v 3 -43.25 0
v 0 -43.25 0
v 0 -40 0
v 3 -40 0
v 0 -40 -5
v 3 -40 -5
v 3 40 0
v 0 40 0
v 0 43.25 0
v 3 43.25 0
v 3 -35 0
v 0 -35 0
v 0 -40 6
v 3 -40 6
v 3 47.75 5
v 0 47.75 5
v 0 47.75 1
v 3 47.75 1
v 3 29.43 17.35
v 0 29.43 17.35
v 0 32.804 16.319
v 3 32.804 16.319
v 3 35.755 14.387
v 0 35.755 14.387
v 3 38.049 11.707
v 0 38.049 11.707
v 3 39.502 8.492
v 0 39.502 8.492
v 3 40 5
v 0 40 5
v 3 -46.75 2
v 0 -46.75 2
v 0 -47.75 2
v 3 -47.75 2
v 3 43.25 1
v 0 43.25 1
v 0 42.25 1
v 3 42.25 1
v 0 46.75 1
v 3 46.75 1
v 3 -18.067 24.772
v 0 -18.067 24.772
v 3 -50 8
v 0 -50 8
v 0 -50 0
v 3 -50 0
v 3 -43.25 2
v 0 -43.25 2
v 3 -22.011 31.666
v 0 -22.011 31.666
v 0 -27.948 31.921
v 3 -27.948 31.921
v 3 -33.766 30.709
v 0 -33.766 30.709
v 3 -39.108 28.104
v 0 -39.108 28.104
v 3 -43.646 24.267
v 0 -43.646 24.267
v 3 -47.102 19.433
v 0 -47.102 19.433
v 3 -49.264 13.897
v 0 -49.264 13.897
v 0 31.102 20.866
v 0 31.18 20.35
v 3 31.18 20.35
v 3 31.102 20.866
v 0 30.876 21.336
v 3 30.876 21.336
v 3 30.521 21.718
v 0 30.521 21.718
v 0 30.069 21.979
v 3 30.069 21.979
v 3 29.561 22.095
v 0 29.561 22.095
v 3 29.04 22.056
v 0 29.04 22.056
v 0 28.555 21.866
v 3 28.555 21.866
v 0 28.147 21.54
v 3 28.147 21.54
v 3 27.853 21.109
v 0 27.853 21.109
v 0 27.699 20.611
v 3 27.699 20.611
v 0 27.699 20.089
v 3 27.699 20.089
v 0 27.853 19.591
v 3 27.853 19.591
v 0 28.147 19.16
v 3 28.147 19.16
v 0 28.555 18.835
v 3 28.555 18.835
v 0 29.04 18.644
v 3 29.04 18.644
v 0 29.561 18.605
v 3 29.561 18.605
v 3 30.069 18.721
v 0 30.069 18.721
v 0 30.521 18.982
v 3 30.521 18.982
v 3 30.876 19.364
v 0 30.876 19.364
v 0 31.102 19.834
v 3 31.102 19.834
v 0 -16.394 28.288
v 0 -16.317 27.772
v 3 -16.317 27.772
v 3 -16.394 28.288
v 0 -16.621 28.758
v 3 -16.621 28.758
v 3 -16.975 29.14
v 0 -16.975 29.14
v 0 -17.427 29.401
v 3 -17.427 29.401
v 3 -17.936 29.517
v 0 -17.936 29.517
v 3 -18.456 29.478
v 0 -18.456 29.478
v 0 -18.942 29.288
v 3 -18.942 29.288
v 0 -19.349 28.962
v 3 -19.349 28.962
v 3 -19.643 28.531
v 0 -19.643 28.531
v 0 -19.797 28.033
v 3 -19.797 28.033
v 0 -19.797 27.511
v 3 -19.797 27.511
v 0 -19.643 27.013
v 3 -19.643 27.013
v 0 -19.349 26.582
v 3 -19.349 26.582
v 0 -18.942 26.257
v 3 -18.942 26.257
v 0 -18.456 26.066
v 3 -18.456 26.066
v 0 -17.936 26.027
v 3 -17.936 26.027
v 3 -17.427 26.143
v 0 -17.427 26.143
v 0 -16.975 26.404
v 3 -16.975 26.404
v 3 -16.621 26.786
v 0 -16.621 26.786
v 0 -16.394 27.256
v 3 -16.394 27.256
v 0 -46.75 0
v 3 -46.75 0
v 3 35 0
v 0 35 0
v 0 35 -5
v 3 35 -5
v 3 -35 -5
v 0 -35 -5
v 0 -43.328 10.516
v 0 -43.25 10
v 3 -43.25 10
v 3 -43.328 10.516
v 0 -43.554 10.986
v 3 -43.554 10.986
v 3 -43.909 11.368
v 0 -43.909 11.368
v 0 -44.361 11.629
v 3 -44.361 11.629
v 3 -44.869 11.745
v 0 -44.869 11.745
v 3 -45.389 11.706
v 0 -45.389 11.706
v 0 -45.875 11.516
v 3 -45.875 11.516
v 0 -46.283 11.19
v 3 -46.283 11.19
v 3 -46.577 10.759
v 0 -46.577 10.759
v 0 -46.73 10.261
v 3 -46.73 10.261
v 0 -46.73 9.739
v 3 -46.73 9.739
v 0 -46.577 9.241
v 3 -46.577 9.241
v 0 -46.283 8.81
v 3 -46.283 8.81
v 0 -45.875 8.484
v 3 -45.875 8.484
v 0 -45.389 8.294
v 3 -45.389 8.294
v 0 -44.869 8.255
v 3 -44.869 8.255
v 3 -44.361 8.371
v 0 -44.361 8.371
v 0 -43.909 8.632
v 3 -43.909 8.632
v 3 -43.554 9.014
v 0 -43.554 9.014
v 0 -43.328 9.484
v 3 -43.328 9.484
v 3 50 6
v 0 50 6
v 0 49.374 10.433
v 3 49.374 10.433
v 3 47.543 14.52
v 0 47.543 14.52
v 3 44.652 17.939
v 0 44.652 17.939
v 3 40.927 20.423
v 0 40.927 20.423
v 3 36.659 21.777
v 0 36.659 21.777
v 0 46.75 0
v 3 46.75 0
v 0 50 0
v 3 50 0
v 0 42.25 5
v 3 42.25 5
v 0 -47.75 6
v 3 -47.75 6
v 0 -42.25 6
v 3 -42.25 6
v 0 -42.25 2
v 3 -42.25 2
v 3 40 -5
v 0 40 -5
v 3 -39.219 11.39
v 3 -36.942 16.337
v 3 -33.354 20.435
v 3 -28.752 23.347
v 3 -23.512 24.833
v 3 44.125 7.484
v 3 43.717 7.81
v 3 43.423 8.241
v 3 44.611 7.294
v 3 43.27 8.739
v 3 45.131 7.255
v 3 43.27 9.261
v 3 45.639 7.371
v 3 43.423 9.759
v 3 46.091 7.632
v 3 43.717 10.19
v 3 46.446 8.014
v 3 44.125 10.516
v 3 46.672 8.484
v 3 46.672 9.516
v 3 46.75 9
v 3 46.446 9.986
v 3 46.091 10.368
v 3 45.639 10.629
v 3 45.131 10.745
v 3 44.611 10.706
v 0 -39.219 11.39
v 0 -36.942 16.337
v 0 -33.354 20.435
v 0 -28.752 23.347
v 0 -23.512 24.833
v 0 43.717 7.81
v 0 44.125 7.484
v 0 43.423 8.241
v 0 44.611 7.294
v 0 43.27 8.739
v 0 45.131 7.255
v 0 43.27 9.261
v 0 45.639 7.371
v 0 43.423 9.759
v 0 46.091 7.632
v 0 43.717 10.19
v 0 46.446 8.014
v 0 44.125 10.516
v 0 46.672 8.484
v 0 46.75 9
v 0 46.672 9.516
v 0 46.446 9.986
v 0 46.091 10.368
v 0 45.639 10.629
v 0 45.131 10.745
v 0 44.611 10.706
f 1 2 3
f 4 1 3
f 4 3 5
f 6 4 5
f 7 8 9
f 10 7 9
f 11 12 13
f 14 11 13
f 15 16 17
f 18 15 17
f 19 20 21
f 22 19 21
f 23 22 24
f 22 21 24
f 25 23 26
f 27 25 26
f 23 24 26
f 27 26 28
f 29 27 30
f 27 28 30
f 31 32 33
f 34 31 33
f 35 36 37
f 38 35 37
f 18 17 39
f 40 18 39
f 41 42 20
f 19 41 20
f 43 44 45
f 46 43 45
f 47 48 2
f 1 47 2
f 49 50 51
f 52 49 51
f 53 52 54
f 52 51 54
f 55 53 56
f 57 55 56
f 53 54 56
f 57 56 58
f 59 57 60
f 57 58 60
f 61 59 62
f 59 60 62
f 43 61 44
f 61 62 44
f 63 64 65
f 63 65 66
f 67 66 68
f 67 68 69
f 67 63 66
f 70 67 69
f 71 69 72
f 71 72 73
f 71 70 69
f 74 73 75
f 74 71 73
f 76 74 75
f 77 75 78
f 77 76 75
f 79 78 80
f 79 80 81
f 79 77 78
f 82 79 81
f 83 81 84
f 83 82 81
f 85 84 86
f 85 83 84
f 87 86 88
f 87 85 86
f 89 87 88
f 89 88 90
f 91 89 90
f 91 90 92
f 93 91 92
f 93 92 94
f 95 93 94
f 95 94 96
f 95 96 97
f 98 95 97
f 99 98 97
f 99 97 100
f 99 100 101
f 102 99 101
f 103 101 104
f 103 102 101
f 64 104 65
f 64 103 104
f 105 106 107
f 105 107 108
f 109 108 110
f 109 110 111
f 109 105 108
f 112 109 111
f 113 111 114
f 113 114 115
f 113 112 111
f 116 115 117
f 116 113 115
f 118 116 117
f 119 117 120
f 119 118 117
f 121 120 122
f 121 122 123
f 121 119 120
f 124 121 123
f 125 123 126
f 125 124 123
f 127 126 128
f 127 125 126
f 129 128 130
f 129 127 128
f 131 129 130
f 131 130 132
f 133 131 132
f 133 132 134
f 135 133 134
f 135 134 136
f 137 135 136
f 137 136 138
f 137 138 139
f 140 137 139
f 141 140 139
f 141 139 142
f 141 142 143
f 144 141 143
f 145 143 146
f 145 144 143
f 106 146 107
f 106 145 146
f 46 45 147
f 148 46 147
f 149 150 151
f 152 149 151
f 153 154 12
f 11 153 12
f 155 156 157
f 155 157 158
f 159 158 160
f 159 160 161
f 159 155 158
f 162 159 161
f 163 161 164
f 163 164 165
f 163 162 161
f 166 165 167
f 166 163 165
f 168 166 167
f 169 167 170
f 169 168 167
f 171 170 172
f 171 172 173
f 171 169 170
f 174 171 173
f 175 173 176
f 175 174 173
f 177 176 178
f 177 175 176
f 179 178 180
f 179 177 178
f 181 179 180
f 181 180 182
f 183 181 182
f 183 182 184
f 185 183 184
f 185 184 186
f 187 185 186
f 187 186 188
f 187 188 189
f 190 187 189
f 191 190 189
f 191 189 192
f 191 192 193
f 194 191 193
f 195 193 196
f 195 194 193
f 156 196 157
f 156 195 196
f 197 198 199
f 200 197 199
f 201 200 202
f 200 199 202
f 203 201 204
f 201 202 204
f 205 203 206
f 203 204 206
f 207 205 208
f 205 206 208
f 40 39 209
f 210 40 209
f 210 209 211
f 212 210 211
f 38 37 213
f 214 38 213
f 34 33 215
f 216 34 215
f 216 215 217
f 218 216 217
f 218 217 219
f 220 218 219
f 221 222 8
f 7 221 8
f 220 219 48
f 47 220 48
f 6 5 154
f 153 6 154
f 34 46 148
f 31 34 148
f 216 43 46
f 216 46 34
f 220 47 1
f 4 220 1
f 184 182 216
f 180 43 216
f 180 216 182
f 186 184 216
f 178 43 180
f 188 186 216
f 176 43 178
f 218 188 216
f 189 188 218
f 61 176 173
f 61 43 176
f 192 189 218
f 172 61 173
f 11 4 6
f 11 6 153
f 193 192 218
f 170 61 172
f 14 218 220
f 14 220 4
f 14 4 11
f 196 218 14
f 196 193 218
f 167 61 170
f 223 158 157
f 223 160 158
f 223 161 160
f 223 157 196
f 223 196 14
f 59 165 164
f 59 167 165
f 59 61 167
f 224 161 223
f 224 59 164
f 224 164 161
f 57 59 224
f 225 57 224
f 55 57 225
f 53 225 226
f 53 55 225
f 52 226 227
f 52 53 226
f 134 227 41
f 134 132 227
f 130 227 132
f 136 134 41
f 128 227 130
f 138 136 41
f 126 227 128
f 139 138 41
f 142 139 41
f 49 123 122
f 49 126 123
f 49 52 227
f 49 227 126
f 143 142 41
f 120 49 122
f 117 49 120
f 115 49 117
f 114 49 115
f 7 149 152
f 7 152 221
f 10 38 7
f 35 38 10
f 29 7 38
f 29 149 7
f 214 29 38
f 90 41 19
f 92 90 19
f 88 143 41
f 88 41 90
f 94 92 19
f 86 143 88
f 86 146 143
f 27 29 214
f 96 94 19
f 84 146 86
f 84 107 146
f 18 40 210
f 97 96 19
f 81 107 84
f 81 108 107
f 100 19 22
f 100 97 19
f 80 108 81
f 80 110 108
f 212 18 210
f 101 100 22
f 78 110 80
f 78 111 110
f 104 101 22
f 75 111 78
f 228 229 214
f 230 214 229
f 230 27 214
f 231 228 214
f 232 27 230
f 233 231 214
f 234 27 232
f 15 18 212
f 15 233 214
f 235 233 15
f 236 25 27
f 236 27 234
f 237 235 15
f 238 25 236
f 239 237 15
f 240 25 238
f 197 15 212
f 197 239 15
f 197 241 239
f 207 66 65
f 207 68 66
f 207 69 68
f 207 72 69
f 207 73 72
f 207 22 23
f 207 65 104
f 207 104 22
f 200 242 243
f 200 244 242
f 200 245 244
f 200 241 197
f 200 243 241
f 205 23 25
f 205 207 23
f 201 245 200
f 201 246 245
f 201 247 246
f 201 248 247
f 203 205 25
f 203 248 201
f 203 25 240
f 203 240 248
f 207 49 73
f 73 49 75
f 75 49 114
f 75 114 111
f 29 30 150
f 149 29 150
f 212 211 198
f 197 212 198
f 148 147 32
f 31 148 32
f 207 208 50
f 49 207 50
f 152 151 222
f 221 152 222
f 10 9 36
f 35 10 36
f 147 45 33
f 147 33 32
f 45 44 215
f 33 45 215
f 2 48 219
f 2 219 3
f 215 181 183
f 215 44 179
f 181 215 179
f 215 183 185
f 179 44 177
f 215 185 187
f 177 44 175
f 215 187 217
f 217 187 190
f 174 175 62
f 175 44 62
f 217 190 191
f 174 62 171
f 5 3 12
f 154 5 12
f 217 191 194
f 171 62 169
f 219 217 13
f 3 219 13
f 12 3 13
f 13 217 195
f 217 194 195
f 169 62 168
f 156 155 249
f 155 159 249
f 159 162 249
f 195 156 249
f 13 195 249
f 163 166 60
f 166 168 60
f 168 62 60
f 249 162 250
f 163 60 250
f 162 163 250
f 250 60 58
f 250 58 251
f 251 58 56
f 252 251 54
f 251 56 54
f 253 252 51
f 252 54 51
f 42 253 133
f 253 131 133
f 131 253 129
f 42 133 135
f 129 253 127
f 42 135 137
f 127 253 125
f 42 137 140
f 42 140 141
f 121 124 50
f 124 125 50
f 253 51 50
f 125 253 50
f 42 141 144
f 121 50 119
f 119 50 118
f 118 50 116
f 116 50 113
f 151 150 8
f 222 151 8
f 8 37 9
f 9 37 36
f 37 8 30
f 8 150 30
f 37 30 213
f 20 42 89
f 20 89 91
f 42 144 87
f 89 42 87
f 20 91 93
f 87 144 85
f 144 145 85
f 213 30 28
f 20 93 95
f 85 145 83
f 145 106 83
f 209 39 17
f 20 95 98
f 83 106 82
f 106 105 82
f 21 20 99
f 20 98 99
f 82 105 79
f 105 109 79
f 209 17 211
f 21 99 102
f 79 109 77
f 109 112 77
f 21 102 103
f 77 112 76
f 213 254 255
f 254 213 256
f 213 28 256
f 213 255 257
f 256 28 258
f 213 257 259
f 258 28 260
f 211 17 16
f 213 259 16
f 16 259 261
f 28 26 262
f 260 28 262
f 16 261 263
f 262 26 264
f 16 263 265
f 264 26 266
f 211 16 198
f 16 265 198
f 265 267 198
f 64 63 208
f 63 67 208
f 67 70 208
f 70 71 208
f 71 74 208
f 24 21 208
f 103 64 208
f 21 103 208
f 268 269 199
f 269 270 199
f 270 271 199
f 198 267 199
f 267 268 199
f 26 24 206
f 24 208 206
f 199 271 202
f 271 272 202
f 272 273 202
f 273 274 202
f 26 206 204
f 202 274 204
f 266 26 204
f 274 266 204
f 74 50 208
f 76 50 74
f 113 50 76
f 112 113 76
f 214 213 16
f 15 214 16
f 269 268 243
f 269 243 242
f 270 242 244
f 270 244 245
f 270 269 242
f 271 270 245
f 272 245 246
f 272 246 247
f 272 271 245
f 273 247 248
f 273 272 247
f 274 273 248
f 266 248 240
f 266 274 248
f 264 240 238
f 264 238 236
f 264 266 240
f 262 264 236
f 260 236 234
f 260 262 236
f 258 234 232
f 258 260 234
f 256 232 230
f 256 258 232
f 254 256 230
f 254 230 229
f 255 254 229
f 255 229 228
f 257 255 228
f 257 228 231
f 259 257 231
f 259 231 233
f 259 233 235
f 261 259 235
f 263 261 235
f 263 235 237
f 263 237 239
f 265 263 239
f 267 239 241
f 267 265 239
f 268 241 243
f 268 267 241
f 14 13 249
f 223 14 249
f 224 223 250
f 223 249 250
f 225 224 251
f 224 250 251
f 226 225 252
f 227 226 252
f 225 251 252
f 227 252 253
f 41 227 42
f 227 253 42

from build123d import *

# Parameters (mm, degrees)
F1_R     = 1.75
F2_DEPTH = 3


with BuildPart() as f2:
    # F1 (on Right) → F2 (new body)
    with BuildSketch(Plane.YZ):
        with BuildLine():
            Line((-50, 8), (-50, 0))
            Line((-50, 0), (-46.75, 0))
            Line((-46.75, 0), (-46.75, 2))
            Line((-46.75, 2), (-47.75, 2))
            Line((-47.75, 2), (-47.75, 6))
            Line((-47.75, 6), (-42.25, 6))
            Line((-42.25, 6), (-42.25, 2))
            Line((-42.25, 2), (-43.25, 2))
            Line((-43.25, 2), (-43.25, 0))
            Line((-43.25, 0), (-40, 0))
            Line((-40, 0), (-40, -5))
            Line((-40, -5), (-35, -5))
            Line((-35, -5), (-35, 0))
            Line((-35, 0), (-40, 6))
            ThreePointArc((-40, 6), (-33.354443, 20.434949), (-18.066553, 24.772184))
            Line((-18.066553, 24.772184), (29.429899, 17.350121))
            ThreePointArc((29.429899, 17.350121), (36.996677, 13.127923), (40, 5))
            Line((40, 5), (35, 0))
            Line((35, 0), (35, -5))
            Line((35, -5), (40, -5))
            Line((40, -5), (40, 0))
            Line((40, 0), (43.25, 0))
            Line((43.25, 0), (43.25, 1))
            Line((43.25, 1), (42.25, 1))
            Line((42.25, 1), (42.25, 5))
            Line((42.25, 5), (47.75, 5))
            Line((47.75, 5), (47.75, 1))
            Line((47.75, 1), (46.75, 1))
            Line((46.75, 1), (46.75, 0))
            Line((46.75, 0), (50, 0))
            Line((50, 0), (50, 6))
            ThreePointArc((50, 6), (46.217774, 16.330828), (36.659249, 21.777465))
            Line((36.659249, 21.777465), (-22.011127, 31.666197))
            ThreePointArc((-22.011127, 31.666197), (-41.496242, 26.32666), (-50, 8))
        make_face()
        with Locations((-45, 10)):
            Circle(F1_R, mode=Mode.SUBTRACT)
        with Locations((45, 9)):
            Circle(F1_R, mode=Mode.SUBTRACT)
        with Locations((-18.066553, 27.772184)):
            Circle(F1_R, mode=Mode.SUBTRACT)
        with Locations((29.429899, 20.350121)):
            Circle(F1_R, mode=Mode.SUBTRACT)
    extrude(amount=F2_DEPTH)


solid = f2.part
